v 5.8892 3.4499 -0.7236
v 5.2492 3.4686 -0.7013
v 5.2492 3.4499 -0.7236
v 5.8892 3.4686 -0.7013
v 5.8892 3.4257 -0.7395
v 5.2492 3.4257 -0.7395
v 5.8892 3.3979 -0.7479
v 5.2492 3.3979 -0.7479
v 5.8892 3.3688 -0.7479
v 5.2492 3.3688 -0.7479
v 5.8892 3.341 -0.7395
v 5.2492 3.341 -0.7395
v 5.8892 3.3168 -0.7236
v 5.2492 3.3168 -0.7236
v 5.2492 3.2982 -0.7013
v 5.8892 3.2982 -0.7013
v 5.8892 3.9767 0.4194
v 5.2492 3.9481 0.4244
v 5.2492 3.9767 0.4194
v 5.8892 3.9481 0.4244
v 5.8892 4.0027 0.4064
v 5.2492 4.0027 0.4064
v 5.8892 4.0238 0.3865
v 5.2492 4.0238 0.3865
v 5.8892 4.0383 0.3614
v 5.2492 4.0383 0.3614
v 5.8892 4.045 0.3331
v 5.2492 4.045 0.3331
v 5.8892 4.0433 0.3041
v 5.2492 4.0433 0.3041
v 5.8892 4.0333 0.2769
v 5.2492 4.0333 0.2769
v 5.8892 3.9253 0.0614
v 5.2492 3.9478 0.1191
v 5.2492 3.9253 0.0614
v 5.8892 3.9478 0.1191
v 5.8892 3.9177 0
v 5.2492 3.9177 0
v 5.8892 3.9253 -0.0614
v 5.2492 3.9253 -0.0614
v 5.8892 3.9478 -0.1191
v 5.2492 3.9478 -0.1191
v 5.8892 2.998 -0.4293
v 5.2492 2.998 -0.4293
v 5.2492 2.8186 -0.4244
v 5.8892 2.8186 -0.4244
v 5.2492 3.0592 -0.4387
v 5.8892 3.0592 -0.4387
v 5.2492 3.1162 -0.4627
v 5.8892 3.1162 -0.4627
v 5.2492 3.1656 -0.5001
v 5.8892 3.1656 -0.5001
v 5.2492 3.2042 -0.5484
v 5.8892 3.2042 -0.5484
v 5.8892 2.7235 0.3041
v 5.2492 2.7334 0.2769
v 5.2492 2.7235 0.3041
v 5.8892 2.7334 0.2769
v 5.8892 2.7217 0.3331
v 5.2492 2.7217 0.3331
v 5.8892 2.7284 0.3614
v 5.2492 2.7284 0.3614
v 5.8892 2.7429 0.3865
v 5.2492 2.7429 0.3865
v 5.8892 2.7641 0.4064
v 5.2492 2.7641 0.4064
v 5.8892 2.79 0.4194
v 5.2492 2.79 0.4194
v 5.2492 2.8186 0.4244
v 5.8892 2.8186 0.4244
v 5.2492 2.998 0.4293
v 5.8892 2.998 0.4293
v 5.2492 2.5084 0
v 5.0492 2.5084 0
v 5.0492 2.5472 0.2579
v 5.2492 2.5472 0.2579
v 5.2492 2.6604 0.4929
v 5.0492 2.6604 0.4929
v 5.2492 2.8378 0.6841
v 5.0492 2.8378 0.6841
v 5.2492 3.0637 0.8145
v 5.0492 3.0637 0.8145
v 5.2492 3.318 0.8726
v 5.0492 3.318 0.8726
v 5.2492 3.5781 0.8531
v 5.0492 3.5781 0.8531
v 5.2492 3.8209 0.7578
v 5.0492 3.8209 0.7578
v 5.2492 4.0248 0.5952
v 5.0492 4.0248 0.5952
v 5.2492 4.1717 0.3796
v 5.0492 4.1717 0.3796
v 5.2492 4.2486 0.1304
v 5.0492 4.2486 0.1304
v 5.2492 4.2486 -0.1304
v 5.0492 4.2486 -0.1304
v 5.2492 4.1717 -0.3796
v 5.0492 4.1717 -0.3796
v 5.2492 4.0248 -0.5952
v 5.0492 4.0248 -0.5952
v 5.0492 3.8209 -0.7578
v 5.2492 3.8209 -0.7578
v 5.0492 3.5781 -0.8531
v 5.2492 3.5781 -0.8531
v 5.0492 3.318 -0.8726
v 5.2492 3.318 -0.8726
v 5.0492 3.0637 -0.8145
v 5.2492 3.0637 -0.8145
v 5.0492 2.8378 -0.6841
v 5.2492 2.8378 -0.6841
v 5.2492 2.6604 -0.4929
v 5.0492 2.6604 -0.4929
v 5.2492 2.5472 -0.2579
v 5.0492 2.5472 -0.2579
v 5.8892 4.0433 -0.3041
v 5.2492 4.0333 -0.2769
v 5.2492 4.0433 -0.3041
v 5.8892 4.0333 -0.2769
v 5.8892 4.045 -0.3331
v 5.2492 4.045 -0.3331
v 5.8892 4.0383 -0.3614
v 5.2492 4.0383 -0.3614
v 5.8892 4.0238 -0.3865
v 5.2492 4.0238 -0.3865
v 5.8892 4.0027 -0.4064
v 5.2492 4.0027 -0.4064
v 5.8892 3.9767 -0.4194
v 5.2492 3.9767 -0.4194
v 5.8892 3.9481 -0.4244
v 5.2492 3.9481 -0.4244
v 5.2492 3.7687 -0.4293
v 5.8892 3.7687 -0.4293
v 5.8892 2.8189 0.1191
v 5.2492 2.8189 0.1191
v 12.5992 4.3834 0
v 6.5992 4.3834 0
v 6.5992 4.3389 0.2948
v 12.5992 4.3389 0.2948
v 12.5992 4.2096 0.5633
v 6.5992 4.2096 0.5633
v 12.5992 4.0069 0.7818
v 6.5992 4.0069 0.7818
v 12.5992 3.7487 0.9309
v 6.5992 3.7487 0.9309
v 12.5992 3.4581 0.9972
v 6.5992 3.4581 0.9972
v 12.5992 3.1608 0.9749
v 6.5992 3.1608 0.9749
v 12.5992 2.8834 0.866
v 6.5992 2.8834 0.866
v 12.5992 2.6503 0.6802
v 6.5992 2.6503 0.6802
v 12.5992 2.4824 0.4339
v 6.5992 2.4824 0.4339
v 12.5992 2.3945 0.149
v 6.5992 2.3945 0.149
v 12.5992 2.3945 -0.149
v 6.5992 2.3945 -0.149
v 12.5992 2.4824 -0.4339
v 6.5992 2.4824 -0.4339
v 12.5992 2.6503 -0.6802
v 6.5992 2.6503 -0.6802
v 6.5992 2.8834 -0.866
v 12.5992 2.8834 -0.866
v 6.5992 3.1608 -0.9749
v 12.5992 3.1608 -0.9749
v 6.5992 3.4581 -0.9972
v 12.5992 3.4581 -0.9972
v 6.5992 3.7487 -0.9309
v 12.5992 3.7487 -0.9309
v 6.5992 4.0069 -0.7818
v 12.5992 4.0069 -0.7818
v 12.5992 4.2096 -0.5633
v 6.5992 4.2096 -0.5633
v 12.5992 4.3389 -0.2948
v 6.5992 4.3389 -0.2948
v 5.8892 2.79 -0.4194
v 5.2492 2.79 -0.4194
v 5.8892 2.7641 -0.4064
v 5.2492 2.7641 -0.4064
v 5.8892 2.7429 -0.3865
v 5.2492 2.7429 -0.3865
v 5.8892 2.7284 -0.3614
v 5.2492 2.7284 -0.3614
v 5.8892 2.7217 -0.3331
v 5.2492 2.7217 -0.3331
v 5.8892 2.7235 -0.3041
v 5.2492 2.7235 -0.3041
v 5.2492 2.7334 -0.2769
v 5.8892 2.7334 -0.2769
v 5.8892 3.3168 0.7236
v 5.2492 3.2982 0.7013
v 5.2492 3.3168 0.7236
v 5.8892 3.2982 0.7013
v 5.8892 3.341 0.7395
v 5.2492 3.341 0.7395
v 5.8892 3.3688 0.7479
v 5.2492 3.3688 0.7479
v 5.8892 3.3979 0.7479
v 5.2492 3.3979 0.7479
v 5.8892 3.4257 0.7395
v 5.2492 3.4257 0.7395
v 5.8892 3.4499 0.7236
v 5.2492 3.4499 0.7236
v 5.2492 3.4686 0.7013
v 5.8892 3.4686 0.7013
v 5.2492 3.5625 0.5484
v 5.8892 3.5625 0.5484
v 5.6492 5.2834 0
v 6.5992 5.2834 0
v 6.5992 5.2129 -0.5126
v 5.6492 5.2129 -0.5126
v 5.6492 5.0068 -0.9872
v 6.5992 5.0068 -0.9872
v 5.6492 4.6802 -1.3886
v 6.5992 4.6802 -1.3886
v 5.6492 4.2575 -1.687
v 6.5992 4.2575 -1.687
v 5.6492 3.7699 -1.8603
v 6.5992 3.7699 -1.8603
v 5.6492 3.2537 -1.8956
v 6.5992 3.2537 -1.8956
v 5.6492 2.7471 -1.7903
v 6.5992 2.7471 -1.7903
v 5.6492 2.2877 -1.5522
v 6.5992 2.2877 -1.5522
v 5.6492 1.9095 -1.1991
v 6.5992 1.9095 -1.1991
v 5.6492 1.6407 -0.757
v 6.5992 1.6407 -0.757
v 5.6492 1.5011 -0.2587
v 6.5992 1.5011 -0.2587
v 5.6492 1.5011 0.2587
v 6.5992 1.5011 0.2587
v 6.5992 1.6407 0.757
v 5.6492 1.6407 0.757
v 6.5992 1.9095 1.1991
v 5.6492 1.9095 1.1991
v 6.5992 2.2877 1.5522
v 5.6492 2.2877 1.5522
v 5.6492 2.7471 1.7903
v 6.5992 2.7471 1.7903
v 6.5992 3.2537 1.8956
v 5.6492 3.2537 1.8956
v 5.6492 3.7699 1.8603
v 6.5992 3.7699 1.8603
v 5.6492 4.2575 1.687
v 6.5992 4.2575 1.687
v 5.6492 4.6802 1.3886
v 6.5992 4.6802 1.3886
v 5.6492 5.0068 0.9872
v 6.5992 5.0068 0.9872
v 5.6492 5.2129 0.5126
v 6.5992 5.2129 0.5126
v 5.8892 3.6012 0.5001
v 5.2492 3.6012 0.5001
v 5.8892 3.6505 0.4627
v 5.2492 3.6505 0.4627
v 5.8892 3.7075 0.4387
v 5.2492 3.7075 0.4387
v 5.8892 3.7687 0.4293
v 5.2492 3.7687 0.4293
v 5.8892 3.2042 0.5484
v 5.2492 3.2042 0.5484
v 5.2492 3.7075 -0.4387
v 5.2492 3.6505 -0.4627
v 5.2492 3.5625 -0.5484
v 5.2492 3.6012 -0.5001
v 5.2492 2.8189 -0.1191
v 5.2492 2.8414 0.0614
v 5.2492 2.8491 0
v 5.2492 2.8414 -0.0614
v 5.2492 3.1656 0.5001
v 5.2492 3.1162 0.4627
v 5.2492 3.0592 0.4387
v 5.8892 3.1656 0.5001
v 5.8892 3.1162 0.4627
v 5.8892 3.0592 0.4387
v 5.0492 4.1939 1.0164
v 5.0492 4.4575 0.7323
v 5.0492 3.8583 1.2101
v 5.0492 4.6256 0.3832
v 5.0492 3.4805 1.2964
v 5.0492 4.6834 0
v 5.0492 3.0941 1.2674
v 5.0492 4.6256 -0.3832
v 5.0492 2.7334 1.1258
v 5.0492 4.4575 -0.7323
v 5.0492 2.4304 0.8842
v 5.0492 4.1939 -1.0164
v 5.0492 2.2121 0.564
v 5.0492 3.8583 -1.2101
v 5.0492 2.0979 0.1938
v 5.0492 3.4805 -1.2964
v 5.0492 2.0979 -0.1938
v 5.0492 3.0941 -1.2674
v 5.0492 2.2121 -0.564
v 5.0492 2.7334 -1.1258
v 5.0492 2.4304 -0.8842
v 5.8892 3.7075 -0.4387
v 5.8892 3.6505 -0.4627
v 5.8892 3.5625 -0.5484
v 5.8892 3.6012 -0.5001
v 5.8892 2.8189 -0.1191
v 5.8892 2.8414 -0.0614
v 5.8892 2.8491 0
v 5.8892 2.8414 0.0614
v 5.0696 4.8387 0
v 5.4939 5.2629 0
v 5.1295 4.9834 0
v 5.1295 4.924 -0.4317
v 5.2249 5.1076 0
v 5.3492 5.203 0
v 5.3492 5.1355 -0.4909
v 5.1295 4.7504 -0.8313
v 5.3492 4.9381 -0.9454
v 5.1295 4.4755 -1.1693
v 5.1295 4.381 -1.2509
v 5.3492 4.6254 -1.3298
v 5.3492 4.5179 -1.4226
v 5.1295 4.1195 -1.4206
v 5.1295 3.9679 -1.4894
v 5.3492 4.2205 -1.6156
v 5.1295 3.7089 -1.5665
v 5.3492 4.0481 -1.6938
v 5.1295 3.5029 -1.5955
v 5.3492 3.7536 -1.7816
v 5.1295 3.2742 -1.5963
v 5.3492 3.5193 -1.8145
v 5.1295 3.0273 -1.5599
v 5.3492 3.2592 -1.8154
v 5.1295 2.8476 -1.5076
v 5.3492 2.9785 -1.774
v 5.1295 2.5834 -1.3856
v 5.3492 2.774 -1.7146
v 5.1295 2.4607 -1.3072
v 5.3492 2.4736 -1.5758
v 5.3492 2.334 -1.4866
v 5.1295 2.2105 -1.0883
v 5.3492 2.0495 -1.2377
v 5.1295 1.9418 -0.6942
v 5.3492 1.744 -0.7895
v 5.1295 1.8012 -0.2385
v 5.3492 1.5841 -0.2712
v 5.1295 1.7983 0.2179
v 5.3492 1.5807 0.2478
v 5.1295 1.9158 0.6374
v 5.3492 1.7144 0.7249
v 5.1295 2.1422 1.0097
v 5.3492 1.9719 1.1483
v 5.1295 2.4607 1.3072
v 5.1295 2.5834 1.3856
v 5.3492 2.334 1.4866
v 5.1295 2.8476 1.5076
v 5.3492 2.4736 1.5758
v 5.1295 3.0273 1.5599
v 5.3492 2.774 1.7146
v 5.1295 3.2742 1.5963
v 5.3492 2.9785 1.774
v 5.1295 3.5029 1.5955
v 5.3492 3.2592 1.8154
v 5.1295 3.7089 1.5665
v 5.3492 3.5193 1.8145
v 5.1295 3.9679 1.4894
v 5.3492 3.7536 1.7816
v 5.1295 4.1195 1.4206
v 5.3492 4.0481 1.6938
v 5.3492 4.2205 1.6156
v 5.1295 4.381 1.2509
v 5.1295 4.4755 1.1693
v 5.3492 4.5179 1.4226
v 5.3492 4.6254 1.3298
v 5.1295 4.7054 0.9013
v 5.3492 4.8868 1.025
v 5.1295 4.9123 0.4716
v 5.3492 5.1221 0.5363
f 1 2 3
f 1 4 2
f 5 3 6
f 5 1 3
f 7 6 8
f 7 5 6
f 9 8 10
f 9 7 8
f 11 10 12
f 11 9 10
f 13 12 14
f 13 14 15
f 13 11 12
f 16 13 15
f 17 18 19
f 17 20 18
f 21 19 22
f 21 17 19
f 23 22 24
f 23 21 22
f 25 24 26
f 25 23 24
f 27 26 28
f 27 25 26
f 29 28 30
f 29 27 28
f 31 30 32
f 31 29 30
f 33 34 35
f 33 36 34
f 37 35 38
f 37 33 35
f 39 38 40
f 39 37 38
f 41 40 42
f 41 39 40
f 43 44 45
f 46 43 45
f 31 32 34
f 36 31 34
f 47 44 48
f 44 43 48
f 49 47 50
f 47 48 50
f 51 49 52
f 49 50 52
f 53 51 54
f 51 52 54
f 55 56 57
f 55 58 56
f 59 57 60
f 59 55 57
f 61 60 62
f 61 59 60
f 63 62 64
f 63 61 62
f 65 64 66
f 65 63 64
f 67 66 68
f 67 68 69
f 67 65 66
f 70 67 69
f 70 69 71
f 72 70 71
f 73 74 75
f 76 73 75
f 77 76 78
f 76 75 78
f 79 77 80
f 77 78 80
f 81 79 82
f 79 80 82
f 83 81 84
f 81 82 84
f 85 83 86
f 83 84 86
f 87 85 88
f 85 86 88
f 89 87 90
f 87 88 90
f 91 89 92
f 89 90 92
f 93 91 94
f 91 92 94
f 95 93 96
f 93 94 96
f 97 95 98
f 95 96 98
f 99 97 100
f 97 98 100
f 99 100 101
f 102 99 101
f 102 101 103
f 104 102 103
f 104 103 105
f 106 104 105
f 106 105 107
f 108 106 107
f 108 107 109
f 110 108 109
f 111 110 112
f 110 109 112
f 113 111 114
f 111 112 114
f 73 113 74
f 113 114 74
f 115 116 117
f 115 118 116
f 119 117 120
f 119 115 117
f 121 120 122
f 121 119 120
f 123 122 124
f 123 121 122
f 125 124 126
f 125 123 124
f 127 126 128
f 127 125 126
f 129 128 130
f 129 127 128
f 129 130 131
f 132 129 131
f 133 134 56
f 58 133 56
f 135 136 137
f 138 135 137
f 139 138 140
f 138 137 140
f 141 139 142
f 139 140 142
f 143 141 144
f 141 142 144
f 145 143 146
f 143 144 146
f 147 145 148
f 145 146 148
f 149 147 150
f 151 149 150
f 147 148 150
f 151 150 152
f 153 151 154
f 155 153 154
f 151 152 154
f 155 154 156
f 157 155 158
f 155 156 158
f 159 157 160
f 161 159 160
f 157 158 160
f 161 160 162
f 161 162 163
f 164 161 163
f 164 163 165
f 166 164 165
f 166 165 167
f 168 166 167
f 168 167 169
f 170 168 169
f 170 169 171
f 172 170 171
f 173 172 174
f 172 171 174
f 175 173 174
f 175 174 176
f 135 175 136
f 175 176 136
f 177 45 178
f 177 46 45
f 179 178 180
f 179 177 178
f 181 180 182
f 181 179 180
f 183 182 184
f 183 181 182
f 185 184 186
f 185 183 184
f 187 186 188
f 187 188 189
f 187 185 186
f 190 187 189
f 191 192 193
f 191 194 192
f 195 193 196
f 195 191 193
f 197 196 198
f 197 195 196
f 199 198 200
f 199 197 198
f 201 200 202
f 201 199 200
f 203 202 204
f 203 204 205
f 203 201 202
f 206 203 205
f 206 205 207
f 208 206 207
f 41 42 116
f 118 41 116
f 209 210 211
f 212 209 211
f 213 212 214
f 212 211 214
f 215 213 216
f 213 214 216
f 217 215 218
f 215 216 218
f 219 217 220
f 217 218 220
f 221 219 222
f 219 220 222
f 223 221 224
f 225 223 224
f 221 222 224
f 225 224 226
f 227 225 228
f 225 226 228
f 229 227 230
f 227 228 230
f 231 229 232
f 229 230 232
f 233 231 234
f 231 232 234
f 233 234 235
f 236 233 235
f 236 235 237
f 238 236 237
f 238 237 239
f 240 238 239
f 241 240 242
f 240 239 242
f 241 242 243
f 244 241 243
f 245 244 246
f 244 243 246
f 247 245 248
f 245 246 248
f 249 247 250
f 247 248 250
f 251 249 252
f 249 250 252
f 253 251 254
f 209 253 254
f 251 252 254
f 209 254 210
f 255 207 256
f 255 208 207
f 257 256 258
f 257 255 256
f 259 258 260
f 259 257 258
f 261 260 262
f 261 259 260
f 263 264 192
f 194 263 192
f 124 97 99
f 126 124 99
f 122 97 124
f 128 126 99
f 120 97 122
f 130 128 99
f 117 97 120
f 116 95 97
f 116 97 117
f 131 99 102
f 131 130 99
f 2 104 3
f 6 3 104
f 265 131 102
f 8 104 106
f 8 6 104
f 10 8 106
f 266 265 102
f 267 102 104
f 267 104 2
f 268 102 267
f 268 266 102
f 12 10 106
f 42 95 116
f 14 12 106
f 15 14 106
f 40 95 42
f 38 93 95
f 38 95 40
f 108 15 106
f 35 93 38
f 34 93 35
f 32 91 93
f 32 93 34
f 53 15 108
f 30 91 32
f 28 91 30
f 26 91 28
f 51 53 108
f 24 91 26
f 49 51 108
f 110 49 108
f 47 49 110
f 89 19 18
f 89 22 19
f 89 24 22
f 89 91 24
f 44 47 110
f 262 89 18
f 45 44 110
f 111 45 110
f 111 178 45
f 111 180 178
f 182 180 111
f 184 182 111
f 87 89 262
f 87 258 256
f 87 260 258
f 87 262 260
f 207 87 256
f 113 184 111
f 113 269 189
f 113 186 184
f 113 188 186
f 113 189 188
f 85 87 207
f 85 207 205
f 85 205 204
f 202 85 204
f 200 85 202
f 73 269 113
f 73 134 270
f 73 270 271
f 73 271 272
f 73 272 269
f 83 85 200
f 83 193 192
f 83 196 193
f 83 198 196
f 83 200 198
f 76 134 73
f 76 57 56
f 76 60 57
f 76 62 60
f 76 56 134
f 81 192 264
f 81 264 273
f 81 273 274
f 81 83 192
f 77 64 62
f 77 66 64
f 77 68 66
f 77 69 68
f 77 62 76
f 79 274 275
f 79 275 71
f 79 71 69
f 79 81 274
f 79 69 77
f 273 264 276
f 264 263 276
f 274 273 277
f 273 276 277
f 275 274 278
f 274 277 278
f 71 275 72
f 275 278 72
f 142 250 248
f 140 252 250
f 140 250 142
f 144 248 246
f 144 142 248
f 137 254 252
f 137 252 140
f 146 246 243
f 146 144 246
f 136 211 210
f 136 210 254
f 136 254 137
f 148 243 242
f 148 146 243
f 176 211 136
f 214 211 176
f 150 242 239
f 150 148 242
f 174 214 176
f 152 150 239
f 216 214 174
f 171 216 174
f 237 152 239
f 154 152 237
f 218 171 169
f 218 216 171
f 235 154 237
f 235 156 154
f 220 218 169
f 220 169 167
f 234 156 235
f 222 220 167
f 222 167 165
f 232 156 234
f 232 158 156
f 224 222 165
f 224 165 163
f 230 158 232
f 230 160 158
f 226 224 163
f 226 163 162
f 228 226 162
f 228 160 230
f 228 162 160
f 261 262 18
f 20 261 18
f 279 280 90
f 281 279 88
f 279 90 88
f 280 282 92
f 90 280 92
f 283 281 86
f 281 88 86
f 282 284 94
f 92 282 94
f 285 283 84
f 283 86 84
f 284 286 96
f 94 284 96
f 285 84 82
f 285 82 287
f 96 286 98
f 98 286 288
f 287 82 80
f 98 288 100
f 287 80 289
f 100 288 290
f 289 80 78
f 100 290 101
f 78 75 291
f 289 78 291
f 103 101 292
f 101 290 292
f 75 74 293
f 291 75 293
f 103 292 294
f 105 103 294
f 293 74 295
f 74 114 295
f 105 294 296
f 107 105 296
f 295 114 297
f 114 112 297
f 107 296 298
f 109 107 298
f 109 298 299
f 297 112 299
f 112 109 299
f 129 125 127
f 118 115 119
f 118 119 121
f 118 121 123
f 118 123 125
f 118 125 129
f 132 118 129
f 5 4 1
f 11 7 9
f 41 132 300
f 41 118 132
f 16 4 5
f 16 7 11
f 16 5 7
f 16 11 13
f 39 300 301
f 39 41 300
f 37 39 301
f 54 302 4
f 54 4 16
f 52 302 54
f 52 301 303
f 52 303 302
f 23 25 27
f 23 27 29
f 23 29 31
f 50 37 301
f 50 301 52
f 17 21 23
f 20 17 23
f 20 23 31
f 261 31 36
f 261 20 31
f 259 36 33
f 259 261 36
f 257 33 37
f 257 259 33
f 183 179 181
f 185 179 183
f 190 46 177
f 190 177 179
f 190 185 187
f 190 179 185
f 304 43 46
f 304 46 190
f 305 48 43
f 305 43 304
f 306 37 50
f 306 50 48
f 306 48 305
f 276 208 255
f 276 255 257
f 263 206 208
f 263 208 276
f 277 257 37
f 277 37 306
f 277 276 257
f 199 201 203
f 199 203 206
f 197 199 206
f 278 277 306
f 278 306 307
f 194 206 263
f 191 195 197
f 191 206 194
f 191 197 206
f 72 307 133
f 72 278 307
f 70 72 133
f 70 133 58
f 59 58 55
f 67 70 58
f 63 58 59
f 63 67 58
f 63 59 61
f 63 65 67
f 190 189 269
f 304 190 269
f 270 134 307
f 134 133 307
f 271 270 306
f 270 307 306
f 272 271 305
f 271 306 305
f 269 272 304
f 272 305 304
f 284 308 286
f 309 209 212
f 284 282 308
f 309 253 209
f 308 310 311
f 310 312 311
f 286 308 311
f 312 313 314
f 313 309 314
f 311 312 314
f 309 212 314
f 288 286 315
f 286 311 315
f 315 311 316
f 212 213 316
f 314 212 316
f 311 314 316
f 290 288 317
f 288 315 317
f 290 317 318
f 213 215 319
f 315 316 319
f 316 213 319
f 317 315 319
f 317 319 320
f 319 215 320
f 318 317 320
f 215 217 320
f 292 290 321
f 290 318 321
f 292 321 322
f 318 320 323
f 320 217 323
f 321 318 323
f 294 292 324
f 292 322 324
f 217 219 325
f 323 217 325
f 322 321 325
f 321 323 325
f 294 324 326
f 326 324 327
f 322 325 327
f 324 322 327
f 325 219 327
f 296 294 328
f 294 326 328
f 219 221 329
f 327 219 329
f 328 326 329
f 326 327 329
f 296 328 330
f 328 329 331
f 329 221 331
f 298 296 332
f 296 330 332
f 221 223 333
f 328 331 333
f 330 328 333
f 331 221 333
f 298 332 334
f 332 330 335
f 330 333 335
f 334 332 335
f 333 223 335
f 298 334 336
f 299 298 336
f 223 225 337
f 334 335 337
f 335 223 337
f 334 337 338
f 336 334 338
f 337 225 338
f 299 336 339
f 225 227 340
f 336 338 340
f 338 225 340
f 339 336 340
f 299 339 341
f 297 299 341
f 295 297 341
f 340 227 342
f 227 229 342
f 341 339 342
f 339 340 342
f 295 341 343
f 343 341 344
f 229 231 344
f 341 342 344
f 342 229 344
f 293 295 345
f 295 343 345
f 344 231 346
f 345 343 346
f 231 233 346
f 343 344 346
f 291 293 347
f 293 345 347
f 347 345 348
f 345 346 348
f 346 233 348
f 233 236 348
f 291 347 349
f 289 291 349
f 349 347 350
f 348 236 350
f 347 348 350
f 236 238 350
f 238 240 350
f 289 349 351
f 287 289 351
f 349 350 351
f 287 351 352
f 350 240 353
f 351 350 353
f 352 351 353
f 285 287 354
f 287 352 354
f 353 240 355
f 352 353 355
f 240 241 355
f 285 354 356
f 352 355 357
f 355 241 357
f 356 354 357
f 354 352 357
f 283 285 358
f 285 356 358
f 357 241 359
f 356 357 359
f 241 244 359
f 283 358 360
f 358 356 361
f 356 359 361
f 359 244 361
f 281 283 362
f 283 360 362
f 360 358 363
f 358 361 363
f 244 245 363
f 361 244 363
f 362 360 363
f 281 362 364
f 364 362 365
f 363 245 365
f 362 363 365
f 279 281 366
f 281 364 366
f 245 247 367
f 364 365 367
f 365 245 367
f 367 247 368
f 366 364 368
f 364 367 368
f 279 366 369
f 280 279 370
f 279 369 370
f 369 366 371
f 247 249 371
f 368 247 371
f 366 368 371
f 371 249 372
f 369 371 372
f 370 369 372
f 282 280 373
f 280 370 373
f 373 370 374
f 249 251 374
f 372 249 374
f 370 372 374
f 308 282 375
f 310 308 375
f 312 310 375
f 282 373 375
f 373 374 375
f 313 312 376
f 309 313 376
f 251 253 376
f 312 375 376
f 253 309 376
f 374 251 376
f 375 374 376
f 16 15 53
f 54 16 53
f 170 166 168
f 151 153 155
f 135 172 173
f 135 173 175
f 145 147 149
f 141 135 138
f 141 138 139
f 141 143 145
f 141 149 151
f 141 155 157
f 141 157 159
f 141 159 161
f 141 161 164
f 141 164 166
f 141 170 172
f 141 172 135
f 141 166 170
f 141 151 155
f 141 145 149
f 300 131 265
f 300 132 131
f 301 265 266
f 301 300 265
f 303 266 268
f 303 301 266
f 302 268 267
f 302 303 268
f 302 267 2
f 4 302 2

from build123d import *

# Parameters (mm, degrees)
F0_W     = 1.55
F0_H     = 1.9
F2_R     = 0.6
F3_R     = 0.875
F4_DEPTH = 0.2
F5_R     = 1
F6_DEPTH = 6
F8_DEPTH = 0.64
F9_R     = 0.1
F10_R    = 0.25


with BuildPart() as f1:
    # F0 (on Top) → F1 (revolve)
    with BuildSketch(Plane.XY):
        with Locations((5.8241569564, 4.3333681053)):
            Rectangle(F0_W, F0_H)
    revolve(axis=Axis((5.8241569564, 3.3833681053, 0), (-1, 0, 0)))

    # F2
    f2_edges = [f1.edges().sort_by_distance(p)[0] for p in [
        (5.049157, 1.483368, 0),
    ]]
    fillet(f2_edges, radius=F2_R)

    # F3 (on face) → F4 (cut)
    with BuildSketch(Plane(origin=(5.0491569564, 0, 0), x_dir=(0, -1, 0), z_dir=(-1, 0, 0))):
        with Locations((-3.3833681053, 0)):
            Circle(F3_R)
    extrude(amount=-F4_DEPTH, mode=Mode.SUBTRACT)

    # F5 (on face) → F6 (join)
    with BuildSketch(Plane.YZ.offset(6.5991569564)):
        with Locations((3.3833681053, 0)):
            Circle(F5_R)
    extrude(amount=F6_DEPTH)

    # F7 (on face) → F8 (cut)
    with BuildSketch(Plane(origin=(5.2491569564, 0, 0), x_dir=(0, -1, 0), z_dir=(-1, 0, 0))):
        Polygon((-3.1333681053, 0.4330127019), (-3.3833681053, 0.84), (-3.6333681053, 0.4330127019), (-4.1108294444, 0.42), (-3.8833681053, 0), (-4.1108294444, -0.42), (-3.6333681053, -0.4330127019), (-3.3833681053, -0.84), (-3.1333681053, -0.4330127019), (-2.6559067661, -0.42), (-2.8833681053, 0), (-2.6559067661, 0.42), align=None)
    extrude(amount=-F8_DEPTH, mode=Mode.SUBTRACT)

    # F9
    f9_edges = [f1.edges().sort_by_distance(p)[0] for p in [
        (5.569157, 3.383368, 0.84),
        (5.569157, 4.110829, 0.42),
        (5.569157, 4.110829, -0.42),
        (5.569157, 3.383368, -0.84),
        (5.569157, 2.655907, -0.42),
        (5.569157, 2.655907, 0.42),
    ]]
    fillet(f9_edges, radius=F9_R)

    # F10
    f10_edges = [f1.edges().sort_by_distance(p)[0] for p in [
        (5.569157, 3.633368, 0.433013),
        (5.569157, 3.883368, 0),
        (5.569157, 3.633368, -0.433013),
        (5.569157, 3.133368, 0.433013),
        (5.569157, 3.133368, -0.433013),
        (5.569157, 2.883368, 0),
    ]]
    fillet(f10_edges, radius=F10_R)


solid = f1.part
